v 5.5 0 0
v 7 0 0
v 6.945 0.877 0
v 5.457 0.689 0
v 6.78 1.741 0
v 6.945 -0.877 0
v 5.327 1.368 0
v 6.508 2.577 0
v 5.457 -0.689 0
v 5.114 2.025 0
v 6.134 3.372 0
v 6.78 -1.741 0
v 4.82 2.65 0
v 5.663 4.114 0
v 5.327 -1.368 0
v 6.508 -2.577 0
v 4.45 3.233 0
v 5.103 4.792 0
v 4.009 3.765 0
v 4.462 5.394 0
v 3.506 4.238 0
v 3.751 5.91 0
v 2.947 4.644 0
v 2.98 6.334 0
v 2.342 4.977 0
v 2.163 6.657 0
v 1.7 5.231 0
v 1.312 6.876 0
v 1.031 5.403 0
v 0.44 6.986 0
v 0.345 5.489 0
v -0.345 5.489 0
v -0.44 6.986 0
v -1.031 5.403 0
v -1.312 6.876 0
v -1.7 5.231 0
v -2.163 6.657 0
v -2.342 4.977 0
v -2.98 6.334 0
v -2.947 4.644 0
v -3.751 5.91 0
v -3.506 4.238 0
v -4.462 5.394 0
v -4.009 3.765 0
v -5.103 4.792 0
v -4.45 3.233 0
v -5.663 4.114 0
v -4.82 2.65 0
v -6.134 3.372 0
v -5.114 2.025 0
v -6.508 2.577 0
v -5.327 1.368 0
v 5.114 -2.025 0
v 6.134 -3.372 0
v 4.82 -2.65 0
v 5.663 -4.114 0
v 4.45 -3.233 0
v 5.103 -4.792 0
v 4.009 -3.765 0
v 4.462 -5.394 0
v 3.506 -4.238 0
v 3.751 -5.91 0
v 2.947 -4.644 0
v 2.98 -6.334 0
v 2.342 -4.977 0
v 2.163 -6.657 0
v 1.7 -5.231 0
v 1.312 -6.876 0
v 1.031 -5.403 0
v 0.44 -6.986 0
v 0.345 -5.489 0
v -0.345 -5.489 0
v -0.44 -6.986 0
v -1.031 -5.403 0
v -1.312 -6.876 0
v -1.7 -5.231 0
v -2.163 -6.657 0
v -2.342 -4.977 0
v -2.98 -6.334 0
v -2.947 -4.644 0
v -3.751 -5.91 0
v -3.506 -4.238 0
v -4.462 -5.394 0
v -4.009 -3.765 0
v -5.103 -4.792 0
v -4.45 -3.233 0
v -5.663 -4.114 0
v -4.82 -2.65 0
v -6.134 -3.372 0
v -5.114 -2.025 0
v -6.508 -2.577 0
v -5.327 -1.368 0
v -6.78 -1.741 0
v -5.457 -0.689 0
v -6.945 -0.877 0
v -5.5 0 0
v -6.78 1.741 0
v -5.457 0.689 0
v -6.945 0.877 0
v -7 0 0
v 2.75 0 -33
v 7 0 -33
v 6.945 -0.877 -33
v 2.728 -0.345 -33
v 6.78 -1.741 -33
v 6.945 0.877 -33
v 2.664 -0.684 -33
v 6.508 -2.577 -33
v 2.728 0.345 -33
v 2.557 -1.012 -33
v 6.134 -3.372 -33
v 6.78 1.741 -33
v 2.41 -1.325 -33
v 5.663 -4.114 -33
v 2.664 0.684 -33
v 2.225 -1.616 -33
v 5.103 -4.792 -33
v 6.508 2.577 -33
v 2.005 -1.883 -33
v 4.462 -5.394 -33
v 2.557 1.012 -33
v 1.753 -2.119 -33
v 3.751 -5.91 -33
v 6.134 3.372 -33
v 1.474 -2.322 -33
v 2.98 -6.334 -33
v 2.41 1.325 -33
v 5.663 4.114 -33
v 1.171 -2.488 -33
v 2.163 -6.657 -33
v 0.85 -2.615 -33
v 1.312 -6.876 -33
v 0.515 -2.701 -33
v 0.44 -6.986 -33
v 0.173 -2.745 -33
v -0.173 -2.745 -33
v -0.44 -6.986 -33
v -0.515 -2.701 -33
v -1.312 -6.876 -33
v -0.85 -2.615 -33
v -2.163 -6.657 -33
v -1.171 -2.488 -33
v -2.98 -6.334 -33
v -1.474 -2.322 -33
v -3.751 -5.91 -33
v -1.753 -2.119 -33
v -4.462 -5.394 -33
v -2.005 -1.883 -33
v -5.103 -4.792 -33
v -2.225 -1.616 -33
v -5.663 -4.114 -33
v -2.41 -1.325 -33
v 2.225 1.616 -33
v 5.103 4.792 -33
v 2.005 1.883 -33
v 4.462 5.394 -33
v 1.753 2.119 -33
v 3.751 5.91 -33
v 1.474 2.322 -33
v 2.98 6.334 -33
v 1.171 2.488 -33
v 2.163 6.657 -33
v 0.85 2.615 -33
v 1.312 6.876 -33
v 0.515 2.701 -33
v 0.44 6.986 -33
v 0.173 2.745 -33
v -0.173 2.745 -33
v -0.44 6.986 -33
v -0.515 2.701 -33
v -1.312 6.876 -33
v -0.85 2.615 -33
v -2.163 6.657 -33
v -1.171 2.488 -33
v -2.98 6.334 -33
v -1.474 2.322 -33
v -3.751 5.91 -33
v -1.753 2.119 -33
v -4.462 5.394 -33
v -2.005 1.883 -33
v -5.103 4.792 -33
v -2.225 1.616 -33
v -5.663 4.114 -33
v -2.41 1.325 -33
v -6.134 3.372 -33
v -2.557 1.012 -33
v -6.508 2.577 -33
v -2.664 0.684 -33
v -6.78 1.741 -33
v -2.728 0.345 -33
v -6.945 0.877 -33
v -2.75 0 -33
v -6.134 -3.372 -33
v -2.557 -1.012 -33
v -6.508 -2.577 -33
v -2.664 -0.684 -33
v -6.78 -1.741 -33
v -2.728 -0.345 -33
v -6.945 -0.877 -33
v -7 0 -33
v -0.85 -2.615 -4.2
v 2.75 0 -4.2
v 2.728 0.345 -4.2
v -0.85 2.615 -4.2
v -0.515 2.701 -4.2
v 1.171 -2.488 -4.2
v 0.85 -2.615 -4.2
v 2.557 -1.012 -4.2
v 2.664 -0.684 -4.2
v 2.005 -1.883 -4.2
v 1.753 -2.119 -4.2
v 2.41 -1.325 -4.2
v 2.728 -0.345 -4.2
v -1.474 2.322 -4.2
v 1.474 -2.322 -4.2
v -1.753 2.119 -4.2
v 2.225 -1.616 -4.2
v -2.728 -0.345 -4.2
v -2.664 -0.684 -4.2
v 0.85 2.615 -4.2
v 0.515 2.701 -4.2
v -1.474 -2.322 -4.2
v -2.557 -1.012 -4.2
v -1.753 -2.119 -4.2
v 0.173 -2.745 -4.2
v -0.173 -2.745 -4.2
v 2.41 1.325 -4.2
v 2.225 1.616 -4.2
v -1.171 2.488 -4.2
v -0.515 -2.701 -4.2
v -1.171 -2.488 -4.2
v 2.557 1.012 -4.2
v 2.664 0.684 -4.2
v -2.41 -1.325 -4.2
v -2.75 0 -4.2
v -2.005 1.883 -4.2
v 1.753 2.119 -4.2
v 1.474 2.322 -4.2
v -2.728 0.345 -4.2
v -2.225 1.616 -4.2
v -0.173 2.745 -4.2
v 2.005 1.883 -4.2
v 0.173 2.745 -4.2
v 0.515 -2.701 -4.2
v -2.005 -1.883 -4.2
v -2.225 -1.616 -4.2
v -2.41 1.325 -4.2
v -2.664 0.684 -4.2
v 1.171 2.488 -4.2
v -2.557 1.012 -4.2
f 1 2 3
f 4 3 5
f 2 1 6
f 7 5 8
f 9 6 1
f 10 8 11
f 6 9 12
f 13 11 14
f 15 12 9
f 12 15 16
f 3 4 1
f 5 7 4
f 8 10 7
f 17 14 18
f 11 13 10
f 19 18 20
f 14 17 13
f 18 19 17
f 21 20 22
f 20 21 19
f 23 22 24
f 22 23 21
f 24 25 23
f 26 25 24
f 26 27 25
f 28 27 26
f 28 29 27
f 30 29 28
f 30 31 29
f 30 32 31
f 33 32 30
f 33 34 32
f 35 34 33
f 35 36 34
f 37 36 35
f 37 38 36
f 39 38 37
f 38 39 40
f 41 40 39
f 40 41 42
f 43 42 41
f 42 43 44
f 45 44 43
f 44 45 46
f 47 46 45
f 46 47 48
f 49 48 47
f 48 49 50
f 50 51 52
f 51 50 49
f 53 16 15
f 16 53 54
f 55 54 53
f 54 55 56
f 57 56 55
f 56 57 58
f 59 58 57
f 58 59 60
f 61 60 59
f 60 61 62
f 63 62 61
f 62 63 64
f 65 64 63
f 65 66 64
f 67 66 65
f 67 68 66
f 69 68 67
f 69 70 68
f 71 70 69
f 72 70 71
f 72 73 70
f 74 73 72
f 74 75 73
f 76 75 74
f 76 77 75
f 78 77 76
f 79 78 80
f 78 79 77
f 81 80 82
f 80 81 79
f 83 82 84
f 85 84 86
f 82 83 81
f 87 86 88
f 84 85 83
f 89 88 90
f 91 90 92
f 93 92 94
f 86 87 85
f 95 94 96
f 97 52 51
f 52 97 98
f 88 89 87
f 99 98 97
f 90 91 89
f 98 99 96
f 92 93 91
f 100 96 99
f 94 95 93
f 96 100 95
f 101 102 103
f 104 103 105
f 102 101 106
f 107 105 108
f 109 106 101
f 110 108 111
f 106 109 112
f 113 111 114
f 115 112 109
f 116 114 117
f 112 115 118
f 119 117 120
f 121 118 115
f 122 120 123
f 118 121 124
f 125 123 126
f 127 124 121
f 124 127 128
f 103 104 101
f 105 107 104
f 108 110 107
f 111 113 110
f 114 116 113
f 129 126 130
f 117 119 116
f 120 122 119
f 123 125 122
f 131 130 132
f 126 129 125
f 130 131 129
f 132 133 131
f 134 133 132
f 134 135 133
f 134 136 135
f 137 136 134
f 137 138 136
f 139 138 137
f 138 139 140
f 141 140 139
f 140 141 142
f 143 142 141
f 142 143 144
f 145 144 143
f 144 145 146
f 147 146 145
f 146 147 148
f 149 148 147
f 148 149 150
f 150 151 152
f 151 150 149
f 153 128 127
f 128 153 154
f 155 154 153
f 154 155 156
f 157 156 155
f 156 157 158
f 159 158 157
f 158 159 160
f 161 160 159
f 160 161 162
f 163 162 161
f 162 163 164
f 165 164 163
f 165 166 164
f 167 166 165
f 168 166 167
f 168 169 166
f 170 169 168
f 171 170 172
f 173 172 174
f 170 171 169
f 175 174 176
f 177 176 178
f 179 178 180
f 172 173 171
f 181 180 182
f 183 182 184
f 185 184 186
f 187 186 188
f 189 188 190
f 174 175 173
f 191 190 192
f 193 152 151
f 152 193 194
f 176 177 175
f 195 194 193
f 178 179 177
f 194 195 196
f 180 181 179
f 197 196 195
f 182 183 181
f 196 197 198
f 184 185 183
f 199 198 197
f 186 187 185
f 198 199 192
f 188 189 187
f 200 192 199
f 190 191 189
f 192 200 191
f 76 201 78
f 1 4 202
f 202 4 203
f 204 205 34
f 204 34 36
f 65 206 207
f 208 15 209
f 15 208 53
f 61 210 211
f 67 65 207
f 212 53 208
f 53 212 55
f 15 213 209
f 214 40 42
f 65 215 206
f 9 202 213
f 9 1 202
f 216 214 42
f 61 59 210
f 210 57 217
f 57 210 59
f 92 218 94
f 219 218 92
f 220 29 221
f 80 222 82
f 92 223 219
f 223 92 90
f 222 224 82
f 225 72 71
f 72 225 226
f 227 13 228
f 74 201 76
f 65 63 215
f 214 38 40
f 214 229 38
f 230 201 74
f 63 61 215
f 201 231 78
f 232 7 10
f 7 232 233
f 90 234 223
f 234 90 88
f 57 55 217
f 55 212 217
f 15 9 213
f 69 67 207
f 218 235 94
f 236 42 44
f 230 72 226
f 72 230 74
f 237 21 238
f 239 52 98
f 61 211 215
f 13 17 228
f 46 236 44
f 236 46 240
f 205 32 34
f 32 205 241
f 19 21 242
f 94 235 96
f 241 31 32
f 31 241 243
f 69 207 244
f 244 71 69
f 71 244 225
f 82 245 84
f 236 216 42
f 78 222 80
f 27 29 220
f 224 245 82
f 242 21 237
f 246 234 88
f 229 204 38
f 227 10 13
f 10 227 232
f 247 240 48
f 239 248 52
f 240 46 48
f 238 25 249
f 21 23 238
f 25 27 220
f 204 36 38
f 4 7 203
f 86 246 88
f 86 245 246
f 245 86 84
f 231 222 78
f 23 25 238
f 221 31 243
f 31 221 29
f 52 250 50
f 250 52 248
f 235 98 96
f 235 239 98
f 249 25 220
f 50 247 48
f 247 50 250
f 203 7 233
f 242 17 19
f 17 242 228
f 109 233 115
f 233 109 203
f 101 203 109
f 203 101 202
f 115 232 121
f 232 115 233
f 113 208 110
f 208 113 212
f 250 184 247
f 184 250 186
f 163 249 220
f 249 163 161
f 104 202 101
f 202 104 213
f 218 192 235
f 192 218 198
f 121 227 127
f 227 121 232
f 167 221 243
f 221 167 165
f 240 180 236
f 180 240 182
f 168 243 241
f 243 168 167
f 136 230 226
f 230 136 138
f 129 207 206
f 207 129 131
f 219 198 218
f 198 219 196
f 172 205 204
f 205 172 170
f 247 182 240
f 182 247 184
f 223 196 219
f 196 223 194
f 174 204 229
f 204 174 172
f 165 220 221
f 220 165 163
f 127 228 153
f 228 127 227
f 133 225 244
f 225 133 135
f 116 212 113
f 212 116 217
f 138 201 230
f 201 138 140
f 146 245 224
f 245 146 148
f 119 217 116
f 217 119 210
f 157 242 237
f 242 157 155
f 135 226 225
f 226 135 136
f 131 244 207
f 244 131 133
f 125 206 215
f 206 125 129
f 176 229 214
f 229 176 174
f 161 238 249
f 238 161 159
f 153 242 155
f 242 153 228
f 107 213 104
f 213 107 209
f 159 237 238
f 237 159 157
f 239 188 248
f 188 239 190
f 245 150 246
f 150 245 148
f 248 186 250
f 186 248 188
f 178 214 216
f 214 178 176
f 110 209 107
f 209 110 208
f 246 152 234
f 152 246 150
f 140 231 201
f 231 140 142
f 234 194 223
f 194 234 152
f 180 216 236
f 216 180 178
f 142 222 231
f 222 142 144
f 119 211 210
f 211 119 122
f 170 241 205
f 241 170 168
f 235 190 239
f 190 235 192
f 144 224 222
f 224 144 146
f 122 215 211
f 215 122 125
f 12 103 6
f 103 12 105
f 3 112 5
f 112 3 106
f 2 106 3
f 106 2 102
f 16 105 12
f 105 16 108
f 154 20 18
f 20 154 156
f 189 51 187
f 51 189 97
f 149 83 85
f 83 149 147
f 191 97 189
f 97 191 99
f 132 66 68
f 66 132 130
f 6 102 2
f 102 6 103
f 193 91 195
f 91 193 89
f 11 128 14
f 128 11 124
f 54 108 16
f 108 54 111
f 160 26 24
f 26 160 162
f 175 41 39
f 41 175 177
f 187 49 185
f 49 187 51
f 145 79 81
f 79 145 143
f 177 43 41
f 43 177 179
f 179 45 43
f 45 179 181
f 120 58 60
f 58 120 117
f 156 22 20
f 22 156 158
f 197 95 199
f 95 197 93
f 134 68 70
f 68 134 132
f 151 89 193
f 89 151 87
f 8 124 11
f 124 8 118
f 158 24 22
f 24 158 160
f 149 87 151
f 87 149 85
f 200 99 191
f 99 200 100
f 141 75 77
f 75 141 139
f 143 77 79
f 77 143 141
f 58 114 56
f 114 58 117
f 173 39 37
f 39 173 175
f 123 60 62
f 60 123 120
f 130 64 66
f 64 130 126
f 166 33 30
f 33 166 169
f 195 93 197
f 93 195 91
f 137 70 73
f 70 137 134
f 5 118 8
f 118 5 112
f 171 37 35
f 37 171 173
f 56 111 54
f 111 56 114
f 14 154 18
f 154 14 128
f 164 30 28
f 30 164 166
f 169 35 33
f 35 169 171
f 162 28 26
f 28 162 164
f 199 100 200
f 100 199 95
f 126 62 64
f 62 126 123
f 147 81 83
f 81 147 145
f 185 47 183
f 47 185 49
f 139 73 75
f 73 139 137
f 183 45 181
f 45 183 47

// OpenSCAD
$fn = 50;


difference() {
	union() {
		translate(v = [0, 0, -33.0000000000]) {
			cylinder(h = 33, r = 7.0000000000);
		}
		cylinder(h = 0, r = 13.0000000000);
	}
	union() {
		translate(v = [0, 0, 0]) {
			rotate(a = [0, 0, 0]) {
				difference() {
					union() {
						#translate(v = [0, 0, -33.0000000000]) {
							cylinder(h = 33, r = 2.2500000000);
						}
						#translate(v = [0, 0, -4.2000000000]) {
							cylinder(h = 4.2000000000, r1 = 2.7500000000, r2 = 5.5000000000);
						}
						#translate(v = [0, 0, -33.0000000000]) {
							cylinder(h = 33, r = 2.7500000000);
						}
						#translate(v = [0, 0, -33.0000000000]) {
							cylinder(h = 33, r = 2.2500000000);
						}
					}
					union();
				}
			}
		}
	}
}
